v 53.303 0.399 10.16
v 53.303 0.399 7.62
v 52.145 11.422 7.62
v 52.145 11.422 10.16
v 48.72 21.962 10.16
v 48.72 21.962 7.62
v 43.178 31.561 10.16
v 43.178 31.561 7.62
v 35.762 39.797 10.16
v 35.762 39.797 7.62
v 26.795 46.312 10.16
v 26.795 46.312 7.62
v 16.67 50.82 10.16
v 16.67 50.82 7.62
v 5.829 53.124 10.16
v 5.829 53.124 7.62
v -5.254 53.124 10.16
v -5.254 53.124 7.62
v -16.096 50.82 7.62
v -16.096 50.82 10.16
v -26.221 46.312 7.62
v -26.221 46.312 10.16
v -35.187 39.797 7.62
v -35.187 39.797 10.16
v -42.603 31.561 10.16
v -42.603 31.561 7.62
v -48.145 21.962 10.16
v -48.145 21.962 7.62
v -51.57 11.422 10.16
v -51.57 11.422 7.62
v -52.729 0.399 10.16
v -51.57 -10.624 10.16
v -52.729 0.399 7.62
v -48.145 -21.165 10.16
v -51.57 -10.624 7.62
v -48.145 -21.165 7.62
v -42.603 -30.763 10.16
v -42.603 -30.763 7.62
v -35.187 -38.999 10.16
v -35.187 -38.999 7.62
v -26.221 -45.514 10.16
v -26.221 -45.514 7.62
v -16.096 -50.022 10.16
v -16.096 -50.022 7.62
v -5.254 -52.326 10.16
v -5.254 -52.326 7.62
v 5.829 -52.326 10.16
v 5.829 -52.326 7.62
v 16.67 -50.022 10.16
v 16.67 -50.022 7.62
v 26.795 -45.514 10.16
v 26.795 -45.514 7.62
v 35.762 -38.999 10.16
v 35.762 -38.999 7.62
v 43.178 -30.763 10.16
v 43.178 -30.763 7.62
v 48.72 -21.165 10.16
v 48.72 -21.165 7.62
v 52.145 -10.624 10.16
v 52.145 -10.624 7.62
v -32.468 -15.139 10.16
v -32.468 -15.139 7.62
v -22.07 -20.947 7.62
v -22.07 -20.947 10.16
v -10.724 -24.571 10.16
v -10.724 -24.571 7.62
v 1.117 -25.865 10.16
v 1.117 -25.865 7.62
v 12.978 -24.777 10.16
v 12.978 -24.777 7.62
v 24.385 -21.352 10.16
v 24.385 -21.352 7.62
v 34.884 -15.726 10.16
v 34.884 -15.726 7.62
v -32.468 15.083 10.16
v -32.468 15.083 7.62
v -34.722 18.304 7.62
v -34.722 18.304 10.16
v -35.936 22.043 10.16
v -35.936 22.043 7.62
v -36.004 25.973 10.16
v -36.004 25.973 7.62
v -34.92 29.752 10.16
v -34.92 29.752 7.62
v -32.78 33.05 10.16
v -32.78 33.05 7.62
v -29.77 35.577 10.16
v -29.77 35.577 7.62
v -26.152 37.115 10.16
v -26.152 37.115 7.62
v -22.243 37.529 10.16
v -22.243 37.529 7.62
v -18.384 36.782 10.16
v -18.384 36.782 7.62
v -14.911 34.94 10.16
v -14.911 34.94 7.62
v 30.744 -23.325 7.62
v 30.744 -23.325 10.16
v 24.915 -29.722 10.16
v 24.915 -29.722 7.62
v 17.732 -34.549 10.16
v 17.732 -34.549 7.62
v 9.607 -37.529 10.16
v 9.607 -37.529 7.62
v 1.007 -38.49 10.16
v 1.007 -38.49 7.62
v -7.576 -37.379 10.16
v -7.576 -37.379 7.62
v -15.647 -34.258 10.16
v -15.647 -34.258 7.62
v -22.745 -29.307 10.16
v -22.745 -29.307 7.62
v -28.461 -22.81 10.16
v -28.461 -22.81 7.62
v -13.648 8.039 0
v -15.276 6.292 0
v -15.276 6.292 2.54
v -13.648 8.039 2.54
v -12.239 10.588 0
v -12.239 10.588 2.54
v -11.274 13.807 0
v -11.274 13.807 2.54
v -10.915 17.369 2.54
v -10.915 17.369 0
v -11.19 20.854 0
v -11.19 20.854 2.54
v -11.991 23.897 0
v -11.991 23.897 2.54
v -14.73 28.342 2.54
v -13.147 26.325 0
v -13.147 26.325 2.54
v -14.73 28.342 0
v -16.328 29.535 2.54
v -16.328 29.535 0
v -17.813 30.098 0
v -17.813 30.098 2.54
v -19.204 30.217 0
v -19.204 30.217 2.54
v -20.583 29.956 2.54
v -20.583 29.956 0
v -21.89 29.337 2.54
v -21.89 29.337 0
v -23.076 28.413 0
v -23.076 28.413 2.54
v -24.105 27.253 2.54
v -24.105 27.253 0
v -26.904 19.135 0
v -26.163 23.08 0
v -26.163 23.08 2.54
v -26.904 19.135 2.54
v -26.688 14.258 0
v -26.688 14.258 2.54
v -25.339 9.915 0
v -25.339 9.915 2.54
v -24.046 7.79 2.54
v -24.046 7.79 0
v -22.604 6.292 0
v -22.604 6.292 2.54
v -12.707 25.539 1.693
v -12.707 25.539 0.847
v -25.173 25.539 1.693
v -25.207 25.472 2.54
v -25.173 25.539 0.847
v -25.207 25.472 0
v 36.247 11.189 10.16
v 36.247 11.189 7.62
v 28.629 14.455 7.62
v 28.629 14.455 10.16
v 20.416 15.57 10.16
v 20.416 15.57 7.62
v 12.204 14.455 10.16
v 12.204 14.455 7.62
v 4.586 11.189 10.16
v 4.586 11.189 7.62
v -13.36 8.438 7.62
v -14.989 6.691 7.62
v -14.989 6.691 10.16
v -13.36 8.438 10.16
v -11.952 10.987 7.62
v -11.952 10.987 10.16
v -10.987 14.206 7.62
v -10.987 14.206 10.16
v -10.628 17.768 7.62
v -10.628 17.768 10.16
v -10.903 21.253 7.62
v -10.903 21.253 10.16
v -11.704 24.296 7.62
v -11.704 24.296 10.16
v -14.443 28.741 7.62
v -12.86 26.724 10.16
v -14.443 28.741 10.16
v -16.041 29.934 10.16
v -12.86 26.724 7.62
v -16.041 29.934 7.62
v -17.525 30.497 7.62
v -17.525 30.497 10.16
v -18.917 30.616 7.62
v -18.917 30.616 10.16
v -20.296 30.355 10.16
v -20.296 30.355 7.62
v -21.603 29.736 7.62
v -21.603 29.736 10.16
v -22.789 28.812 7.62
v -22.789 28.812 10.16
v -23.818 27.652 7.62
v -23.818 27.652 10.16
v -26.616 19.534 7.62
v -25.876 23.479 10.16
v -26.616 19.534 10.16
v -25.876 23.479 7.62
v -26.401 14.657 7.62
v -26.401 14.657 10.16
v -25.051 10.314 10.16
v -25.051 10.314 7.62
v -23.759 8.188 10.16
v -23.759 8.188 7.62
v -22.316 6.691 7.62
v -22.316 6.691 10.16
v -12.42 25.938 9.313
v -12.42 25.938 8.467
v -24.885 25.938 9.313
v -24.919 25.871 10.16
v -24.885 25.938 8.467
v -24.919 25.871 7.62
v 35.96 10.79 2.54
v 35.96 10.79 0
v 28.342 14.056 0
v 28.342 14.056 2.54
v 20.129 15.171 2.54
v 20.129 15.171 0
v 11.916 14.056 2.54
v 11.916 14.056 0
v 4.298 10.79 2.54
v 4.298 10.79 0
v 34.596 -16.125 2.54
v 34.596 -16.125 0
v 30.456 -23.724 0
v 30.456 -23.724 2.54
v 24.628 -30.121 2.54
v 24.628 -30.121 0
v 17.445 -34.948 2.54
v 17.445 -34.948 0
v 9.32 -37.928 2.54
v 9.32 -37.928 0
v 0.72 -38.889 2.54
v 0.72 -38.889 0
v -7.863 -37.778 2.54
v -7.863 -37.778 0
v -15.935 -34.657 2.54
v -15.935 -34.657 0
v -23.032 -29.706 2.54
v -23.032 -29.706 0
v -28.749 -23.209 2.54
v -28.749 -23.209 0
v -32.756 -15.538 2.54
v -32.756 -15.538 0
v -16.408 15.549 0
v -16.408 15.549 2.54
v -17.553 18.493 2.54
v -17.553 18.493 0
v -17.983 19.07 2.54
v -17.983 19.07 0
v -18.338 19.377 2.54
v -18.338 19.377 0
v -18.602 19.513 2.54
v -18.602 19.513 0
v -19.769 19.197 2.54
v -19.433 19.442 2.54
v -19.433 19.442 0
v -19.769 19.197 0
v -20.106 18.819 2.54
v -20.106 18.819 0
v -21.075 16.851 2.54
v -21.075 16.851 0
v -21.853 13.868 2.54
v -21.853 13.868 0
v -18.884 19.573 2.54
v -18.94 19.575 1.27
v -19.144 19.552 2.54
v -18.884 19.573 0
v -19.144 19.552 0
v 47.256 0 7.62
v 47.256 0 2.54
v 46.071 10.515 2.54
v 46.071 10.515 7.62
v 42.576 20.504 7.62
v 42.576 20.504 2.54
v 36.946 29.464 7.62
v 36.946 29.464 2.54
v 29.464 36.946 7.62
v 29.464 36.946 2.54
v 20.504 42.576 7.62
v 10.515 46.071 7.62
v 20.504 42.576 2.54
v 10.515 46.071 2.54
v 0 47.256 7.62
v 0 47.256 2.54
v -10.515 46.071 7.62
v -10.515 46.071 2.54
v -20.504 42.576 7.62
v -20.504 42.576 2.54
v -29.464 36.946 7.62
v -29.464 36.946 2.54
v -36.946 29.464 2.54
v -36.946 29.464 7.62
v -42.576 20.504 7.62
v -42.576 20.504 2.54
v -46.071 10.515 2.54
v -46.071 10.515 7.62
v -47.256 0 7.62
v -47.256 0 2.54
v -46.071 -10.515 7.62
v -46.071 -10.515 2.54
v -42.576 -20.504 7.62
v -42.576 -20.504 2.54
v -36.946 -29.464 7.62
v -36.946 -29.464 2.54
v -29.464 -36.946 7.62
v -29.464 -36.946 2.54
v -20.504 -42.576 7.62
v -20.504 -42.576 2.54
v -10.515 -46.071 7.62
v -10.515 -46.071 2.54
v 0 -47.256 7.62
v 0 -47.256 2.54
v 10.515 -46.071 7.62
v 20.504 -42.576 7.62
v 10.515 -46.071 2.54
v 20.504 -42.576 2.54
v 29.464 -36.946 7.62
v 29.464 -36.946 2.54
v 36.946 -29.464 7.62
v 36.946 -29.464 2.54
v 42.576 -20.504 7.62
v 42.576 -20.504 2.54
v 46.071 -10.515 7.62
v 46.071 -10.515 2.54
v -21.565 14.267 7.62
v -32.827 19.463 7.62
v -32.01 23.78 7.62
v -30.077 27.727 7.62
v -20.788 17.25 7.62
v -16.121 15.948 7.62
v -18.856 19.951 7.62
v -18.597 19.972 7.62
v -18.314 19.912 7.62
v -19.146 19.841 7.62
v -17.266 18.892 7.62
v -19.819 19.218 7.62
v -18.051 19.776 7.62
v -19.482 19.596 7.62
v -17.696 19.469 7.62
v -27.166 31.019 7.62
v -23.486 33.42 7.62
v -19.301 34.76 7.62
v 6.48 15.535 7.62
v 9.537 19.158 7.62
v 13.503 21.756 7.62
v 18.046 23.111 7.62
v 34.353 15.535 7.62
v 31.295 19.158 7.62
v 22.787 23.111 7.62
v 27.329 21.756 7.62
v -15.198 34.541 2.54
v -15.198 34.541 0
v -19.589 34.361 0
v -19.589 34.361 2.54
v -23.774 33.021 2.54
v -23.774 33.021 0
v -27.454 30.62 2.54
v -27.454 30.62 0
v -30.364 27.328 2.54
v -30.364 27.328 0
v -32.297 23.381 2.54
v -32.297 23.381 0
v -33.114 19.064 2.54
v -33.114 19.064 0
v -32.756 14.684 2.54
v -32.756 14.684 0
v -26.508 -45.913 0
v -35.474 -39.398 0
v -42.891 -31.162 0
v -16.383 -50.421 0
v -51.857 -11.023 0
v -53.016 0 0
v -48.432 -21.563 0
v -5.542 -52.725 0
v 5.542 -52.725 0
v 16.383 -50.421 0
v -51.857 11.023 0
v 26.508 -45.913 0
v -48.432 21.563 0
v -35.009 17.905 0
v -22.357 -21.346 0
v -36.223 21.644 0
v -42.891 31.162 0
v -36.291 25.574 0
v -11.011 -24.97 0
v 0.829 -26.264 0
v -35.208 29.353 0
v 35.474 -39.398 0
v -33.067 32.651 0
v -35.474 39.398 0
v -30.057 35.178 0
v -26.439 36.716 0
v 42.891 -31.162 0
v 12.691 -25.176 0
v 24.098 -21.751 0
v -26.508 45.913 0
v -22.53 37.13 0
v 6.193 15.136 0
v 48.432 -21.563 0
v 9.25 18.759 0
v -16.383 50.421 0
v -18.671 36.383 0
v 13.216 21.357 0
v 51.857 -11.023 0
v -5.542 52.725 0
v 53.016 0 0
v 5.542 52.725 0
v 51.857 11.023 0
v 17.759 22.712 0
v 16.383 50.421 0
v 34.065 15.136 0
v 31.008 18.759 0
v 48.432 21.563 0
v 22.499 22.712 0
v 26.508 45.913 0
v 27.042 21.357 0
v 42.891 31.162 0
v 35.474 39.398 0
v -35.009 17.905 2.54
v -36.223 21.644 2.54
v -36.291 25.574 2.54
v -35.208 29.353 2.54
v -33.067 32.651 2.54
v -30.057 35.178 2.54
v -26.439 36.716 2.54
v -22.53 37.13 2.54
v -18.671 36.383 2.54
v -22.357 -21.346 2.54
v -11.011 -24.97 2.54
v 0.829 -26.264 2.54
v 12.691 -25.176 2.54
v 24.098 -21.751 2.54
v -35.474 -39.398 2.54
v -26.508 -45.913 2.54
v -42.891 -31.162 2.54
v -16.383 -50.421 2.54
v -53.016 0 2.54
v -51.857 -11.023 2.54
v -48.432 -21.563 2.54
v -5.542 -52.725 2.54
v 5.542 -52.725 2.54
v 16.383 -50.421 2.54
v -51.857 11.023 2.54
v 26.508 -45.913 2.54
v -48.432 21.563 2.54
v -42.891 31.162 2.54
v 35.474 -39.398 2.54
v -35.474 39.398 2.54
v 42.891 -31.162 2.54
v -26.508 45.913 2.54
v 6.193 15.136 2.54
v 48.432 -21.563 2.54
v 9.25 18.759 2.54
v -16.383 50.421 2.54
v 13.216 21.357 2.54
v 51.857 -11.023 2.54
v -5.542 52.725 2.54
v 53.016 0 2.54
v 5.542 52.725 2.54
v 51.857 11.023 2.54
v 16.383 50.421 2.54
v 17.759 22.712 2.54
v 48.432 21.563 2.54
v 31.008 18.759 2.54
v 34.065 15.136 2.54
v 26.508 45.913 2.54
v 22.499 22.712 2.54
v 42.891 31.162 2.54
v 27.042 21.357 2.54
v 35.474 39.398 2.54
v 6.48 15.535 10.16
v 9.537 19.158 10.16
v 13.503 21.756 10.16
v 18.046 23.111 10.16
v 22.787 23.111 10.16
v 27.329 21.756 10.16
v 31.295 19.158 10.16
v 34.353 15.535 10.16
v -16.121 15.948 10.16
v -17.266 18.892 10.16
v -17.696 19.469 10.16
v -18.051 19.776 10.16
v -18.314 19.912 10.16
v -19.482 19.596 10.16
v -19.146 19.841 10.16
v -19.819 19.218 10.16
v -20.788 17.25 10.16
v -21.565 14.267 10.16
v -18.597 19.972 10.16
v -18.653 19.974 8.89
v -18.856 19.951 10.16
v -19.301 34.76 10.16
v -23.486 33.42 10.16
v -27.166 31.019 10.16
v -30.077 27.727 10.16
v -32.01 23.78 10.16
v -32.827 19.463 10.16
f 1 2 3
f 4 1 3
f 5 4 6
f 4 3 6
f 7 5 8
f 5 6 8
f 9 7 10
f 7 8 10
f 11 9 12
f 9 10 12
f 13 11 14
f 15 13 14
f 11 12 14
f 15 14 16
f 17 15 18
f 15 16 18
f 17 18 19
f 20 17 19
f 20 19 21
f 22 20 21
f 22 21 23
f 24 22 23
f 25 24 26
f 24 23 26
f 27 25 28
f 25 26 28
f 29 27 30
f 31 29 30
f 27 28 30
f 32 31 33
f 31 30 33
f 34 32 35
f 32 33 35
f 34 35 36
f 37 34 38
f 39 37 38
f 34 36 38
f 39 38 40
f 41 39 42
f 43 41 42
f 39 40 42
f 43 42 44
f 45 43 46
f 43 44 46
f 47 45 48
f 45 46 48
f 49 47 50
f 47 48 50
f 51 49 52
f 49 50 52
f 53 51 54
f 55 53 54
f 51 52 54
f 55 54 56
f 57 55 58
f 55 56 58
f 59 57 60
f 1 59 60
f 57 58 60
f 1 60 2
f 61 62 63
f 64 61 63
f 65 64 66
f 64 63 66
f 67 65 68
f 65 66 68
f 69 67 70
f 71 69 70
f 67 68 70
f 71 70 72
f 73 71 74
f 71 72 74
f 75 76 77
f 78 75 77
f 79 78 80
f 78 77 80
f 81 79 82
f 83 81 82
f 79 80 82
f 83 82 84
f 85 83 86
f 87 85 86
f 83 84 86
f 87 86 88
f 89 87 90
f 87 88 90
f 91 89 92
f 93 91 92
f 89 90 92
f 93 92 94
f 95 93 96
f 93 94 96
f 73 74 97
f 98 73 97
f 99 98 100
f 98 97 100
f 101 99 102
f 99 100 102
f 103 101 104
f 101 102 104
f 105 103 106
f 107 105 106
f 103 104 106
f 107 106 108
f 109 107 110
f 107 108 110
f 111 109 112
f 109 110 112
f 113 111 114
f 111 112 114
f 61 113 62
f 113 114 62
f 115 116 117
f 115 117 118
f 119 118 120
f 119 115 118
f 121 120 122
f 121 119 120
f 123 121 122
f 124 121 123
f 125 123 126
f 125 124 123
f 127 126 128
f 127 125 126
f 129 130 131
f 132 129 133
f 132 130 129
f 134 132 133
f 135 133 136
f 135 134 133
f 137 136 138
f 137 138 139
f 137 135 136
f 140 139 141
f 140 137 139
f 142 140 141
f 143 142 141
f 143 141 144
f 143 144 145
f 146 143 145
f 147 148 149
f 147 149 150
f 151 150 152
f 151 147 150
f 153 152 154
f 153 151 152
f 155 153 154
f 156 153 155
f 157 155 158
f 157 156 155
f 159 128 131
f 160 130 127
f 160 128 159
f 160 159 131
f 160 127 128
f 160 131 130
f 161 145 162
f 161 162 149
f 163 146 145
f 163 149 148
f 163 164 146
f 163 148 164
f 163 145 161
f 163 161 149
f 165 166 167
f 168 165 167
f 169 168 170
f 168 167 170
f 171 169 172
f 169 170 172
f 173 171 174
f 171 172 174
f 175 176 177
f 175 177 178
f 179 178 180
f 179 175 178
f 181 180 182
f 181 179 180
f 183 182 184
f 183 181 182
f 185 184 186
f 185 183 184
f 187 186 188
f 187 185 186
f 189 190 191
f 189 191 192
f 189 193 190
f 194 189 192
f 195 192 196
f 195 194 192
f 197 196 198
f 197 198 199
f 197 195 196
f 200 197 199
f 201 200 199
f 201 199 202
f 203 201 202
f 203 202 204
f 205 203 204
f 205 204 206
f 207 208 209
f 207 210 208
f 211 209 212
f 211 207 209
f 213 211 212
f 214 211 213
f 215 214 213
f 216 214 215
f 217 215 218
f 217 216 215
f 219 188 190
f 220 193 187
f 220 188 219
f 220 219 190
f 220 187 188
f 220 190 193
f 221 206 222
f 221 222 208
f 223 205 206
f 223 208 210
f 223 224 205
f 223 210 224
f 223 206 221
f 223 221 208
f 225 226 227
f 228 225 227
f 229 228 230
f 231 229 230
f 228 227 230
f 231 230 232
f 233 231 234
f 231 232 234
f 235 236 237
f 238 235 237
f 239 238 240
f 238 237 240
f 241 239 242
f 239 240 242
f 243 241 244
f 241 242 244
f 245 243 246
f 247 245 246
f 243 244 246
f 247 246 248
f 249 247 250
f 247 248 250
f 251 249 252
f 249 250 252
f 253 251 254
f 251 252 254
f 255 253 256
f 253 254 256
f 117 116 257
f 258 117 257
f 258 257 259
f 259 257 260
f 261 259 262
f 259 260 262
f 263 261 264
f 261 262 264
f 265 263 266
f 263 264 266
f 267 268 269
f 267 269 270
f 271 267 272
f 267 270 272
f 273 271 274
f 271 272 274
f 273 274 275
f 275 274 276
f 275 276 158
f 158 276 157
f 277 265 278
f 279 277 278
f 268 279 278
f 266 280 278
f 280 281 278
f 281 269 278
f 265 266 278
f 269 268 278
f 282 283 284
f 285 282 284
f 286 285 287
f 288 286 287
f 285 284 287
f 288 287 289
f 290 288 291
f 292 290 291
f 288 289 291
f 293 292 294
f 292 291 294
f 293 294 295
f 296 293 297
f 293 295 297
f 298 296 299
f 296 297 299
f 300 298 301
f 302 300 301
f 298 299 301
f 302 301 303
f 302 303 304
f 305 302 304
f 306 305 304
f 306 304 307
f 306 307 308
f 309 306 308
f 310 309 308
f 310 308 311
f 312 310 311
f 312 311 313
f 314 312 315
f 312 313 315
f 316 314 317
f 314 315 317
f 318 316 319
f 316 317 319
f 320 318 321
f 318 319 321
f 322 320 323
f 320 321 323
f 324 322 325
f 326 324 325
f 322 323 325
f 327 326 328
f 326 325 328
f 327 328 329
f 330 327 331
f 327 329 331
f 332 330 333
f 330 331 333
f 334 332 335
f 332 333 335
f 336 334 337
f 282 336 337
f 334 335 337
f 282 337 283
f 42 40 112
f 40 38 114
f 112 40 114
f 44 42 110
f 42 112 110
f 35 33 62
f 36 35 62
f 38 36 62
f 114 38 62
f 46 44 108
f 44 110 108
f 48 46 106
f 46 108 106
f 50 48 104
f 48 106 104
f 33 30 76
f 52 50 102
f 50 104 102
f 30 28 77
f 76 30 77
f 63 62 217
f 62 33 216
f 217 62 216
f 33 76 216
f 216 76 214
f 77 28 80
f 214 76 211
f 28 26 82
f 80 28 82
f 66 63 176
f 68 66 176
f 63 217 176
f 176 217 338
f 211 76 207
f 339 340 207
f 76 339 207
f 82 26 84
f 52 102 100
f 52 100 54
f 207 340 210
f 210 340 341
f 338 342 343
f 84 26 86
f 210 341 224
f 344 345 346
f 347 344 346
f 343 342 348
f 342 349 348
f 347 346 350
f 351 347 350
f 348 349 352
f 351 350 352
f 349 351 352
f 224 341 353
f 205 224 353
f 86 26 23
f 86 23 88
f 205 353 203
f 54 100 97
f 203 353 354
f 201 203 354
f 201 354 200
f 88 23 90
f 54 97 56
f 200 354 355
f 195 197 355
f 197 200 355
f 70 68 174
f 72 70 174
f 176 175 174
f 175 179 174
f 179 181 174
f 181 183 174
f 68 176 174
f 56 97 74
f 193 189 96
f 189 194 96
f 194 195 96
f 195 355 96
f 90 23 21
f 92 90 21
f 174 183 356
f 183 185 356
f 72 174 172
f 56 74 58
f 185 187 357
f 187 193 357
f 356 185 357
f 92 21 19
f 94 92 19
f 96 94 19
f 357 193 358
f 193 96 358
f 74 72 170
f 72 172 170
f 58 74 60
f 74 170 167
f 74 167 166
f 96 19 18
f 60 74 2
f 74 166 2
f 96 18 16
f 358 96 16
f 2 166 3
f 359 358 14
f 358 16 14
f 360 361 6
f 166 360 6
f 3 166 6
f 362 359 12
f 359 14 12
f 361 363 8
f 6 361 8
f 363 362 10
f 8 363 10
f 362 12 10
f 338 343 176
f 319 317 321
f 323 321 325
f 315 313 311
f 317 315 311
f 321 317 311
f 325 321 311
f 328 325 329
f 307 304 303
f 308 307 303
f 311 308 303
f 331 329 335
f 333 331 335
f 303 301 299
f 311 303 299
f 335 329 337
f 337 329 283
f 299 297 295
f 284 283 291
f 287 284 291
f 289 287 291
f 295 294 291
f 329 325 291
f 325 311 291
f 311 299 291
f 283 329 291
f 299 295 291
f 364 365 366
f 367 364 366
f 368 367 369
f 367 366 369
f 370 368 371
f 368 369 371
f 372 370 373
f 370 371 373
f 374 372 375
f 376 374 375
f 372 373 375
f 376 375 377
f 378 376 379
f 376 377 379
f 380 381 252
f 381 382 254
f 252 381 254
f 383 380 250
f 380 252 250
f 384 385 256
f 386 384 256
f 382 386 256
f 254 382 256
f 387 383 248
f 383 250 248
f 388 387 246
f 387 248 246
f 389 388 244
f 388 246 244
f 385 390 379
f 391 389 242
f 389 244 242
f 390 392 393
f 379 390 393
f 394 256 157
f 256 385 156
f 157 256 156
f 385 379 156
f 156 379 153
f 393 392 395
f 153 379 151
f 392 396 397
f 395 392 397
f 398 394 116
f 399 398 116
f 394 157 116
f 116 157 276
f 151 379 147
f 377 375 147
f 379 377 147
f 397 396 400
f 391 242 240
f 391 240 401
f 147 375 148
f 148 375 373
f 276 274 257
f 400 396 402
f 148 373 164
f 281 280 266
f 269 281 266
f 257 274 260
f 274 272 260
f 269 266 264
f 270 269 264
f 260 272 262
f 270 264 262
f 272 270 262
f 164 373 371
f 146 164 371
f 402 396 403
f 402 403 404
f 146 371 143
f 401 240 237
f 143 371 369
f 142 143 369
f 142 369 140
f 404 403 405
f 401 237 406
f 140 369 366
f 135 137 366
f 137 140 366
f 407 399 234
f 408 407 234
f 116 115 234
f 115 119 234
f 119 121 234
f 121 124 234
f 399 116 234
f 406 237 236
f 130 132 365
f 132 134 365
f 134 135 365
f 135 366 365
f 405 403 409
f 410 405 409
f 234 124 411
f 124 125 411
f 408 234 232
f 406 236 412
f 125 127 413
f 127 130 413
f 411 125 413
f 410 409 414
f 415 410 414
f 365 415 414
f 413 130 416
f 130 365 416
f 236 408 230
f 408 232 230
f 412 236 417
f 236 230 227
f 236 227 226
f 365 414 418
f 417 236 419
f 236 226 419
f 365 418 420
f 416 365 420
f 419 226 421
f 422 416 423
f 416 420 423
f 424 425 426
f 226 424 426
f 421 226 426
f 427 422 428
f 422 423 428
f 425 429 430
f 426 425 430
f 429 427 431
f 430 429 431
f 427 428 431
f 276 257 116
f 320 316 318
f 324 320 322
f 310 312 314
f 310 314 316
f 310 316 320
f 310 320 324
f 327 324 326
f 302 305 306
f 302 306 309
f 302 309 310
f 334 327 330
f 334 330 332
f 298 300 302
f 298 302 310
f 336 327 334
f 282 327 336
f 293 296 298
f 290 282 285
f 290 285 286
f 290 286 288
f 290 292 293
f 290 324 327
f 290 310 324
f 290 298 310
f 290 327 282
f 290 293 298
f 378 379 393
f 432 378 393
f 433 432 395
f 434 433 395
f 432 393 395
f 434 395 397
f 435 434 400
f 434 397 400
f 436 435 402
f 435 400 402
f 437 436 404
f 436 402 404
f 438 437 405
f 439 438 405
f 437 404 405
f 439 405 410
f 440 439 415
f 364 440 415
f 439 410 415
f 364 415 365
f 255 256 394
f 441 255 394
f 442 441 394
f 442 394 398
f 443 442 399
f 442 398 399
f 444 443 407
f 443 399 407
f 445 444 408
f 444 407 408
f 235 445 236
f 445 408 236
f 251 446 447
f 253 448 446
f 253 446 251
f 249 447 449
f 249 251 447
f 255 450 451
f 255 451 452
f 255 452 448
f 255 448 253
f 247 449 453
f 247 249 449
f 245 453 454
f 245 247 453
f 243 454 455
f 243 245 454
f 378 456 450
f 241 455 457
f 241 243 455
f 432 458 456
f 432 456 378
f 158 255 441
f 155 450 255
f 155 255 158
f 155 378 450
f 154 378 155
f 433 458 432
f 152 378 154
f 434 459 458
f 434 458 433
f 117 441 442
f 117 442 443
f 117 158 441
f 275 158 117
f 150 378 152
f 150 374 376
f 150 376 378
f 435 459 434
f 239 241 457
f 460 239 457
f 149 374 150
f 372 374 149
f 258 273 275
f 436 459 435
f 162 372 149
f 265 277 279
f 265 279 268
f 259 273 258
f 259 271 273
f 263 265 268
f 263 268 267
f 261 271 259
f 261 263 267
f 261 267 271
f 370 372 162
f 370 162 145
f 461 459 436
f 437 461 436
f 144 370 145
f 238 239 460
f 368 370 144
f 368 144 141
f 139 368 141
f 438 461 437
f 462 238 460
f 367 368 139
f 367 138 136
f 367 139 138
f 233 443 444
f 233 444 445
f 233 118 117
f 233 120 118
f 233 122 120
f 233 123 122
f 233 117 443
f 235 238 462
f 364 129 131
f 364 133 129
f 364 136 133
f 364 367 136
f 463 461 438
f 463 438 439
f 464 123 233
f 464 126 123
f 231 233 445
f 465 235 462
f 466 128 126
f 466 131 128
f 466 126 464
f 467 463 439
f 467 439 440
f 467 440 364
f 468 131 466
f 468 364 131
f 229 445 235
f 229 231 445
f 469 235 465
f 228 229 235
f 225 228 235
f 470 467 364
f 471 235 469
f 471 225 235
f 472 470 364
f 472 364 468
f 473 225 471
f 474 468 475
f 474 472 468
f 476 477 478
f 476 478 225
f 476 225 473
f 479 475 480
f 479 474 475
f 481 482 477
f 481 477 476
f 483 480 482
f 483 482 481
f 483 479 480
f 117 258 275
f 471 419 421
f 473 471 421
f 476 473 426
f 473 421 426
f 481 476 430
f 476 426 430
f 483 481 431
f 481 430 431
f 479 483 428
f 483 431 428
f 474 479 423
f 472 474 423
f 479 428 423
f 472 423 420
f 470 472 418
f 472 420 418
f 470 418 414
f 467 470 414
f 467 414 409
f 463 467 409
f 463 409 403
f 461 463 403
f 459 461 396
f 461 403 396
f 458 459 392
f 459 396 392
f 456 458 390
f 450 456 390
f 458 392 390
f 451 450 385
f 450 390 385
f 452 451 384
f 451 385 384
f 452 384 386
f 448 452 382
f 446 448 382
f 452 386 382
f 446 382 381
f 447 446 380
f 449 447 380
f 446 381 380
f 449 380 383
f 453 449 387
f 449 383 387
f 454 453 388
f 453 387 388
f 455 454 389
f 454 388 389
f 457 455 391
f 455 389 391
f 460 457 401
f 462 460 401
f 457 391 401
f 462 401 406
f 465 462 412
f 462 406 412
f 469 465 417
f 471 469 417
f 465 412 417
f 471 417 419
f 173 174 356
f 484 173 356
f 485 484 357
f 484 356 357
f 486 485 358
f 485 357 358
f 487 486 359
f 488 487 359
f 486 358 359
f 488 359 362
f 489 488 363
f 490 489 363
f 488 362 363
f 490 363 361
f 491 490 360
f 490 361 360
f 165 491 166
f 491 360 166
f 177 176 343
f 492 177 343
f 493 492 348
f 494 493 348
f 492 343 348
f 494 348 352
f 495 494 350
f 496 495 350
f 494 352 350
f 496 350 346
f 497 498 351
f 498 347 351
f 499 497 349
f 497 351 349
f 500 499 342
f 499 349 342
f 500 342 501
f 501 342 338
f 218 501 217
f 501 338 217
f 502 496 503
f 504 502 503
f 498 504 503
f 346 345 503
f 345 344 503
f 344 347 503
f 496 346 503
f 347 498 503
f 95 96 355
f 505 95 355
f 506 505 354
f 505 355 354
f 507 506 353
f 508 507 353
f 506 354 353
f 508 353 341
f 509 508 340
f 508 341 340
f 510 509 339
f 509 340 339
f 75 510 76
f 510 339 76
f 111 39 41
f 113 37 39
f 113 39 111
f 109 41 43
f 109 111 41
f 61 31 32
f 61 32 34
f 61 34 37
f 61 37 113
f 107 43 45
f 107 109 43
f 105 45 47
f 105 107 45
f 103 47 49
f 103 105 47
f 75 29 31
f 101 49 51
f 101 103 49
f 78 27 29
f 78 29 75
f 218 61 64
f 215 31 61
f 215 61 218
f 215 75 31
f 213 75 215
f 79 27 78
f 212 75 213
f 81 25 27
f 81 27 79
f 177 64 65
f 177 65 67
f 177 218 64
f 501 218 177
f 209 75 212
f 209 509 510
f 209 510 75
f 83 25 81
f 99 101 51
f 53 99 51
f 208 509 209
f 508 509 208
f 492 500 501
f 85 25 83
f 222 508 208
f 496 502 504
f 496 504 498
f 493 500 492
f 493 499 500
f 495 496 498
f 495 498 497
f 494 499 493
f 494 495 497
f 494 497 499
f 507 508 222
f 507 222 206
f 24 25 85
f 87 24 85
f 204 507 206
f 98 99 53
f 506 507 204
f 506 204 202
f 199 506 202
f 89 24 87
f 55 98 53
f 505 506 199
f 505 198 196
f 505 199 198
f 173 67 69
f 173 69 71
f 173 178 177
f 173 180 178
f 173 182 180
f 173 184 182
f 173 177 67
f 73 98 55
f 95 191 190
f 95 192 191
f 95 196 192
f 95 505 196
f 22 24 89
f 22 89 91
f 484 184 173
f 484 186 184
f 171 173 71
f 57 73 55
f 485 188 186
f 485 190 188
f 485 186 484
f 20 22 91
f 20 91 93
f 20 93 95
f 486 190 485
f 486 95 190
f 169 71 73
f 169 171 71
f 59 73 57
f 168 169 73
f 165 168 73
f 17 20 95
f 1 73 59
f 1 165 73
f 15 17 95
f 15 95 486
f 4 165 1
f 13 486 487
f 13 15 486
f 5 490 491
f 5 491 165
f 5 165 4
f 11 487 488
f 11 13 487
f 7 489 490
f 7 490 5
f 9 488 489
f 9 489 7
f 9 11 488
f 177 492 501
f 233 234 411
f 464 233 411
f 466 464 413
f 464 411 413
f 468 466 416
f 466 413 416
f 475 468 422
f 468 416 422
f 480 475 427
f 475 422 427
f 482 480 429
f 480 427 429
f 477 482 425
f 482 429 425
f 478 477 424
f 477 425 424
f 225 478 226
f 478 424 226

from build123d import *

# Parameters (mm, degrees)
F0_R     = 53.0157982363
F1_DEPTH = 2.54
F2_R     = 47.2560567117
F3_DEPTH = 5.08
F4_R     = 53.0157982363
F5_DEPTH = 2.54


with BuildPart() as f1:
    # F0 (on Top) → F1 (new body)
    with BuildSketch(Plane.XY):
        Circle(F0_R)
        with BuildLine():
            ThreePointArc((34.5963537693, -16.124624759), (0.7195010855, -38.8894264346), (-32.7556952834, -15.5380116776))
            ThreePointArc((-32.7556952834, -15.5380116776), (0.8294682353, -26.2635353639), (34.5963537693, -16.124624759))
        make_face(mode=Mode.SUBTRACT)
        with BuildLine():
            add(Edge.make_bspline(
                [(-15.2761812583, 6.2920888366), (-6.4745691616, 13.4173637556), (-12.7072304958, 25.5387976443), (-18.9398918301, 37.660231533), (-25.1725531643, 25.5387976443), (-31.4052144986, 13.4173637556), (-22.6036024019, 6.2920888366)],
                knots=[0.474035322, 0.474035322, 0.474035322, 2.2524068764, 2.2524068764, 4.0307784308, 4.0307784308, 5.8091499851, 5.8091499851, 5.8091499851], degree=2, weights=[1, 0.6300445274, 1, 0.6300445274, 1, 0.6300445274, 1]))
            add(Edge.make_bspline(
                [(-15.2761812583, 6.2920888366), (-15.5944365201, 19.5747613907), (-18.9398918301, 19.5747613907), (-22.2853471401, 19.5747613907), (-22.6036024019, 6.2920888366)],
                knots=[1.6660710276, 1.6660710276, 1.6660710276, 3.1415926536, 3.1415926536, 4.6171142796, 4.6171142796, 4.6171142796], degree=2, weights=[1, 0.7399765629, 1, 0.7399765629, 1]))
        make_face(mode=Mode.SUBTRACT)
        with BuildLine():
            ThreePointArc((-32.7556952834, 14.6841080859), (-33.0674816797, 32.6505443622), (-15.1981087402, 34.5414578915))
            ThreePointArc((-15.1981087402, 34.5414578915), (-29.0196103006, 29.0714740054), (-32.7556952834, 14.6841080859))
        make_face(mode=Mode.SUBTRACT)
        with BuildLine():
            ThreePointArc((4.2984438121, 10.7904156464), (20.1290514312, 22.8840550051), (35.9596590504, 10.7904156464))
            ThreePointArc((35.9596590504, 10.7904156464), (20.1290514312, 15.1713824312), (4.2984438121, 10.7904156464))
        make_face(mode=Mode.SUBTRACT)
    extrude(amount=F1_DEPTH)


with BuildPart() as f3:
    # F2 (on face) → F3 (new body)
    with BuildSketch(Plane.XY.offset(2.54)):
        Circle(F2_R)
    extrude(amount=F3_DEPTH)


with BuildPart() as f5:
    # F4 (on face) → F5 (new body)
    with BuildSketch(Plane.XY.offset(7.62)):
        with Locations((0.2872720361, 0.3989652069)):
            Circle(F4_R)
        with BuildLine():
            ThreePointArc((34.8836258054, -15.7256595521), (1.0067731216, -38.4904612278), (-32.4684232473, -15.1390464707))
            ThreePointArc((-32.4684232473, -15.1390464707), (1.1167402714, -25.864570157), (34.8836258054, -15.7256595521))
        make_face(mode=Mode.SUBTRACT)
        with BuildLine():
            add(Edge.make_bspline(
                [(-14.9889092222, 6.6910540435), (-6.1872971255, 13.8163289625), (-12.4199584598, 25.9377628512), (-18.652619794, 38.0591967398), (-24.8852811283, 25.9377628512), (-31.1179424625, 13.8163289625), (-22.3163303658, 6.6910540435)],
                knots=[0.474035322, 0.474035322, 0.474035322, 2.2524068764, 2.2524068764, 4.0307784308, 4.0307784308, 5.8091499851, 5.8091499851, 5.8091499851], degree=2, weights=[1, 0.6300445274, 1, 0.6300445274, 1, 0.6300445274, 1]))
            add(Edge.make_bspline(
                [(-14.9889092222, 6.6910540435), (-15.307164484, 19.9737265975), (-18.652619794, 19.9737265975), (-21.998075104, 19.9737265975), (-22.3163303658, 6.6910540435)],
                knots=[1.6660710276, 1.6660710276, 1.6660710276, 3.1415926536, 3.1415926536, 4.6171142796, 4.6171142796, 4.6171142796], degree=2, weights=[1, 0.7399765629, 1, 0.7399765629, 1]))
        make_face(mode=Mode.SUBTRACT)
        with BuildLine():
            ThreePointArc((-32.4684232473, 15.0830732928), (-32.7802096436, 33.0495095691), (-14.9108367041, 34.9404230983))
            ThreePointArc((-14.9108367041, 34.9404230983), (-28.7323382645, 29.4704392122), (-32.4684232473, 15.0830732928))
        make_face(mode=Mode.SUBTRACT)
        with BuildLine():
            ThreePointArc((4.5857158482, 11.1893808532), (20.4163234673, 23.283020212), (36.2469310864, 11.1893808532))
            ThreePointArc((36.2469310864, 11.1893808532), (20.4163234673, 15.570347638), (4.5857158482, 11.1893808532))
        make_face(mode=Mode.SUBTRACT)
    extrude(amount=F5_DEPTH)


solid = Compound([f1.part, f3.part, f5.part])
